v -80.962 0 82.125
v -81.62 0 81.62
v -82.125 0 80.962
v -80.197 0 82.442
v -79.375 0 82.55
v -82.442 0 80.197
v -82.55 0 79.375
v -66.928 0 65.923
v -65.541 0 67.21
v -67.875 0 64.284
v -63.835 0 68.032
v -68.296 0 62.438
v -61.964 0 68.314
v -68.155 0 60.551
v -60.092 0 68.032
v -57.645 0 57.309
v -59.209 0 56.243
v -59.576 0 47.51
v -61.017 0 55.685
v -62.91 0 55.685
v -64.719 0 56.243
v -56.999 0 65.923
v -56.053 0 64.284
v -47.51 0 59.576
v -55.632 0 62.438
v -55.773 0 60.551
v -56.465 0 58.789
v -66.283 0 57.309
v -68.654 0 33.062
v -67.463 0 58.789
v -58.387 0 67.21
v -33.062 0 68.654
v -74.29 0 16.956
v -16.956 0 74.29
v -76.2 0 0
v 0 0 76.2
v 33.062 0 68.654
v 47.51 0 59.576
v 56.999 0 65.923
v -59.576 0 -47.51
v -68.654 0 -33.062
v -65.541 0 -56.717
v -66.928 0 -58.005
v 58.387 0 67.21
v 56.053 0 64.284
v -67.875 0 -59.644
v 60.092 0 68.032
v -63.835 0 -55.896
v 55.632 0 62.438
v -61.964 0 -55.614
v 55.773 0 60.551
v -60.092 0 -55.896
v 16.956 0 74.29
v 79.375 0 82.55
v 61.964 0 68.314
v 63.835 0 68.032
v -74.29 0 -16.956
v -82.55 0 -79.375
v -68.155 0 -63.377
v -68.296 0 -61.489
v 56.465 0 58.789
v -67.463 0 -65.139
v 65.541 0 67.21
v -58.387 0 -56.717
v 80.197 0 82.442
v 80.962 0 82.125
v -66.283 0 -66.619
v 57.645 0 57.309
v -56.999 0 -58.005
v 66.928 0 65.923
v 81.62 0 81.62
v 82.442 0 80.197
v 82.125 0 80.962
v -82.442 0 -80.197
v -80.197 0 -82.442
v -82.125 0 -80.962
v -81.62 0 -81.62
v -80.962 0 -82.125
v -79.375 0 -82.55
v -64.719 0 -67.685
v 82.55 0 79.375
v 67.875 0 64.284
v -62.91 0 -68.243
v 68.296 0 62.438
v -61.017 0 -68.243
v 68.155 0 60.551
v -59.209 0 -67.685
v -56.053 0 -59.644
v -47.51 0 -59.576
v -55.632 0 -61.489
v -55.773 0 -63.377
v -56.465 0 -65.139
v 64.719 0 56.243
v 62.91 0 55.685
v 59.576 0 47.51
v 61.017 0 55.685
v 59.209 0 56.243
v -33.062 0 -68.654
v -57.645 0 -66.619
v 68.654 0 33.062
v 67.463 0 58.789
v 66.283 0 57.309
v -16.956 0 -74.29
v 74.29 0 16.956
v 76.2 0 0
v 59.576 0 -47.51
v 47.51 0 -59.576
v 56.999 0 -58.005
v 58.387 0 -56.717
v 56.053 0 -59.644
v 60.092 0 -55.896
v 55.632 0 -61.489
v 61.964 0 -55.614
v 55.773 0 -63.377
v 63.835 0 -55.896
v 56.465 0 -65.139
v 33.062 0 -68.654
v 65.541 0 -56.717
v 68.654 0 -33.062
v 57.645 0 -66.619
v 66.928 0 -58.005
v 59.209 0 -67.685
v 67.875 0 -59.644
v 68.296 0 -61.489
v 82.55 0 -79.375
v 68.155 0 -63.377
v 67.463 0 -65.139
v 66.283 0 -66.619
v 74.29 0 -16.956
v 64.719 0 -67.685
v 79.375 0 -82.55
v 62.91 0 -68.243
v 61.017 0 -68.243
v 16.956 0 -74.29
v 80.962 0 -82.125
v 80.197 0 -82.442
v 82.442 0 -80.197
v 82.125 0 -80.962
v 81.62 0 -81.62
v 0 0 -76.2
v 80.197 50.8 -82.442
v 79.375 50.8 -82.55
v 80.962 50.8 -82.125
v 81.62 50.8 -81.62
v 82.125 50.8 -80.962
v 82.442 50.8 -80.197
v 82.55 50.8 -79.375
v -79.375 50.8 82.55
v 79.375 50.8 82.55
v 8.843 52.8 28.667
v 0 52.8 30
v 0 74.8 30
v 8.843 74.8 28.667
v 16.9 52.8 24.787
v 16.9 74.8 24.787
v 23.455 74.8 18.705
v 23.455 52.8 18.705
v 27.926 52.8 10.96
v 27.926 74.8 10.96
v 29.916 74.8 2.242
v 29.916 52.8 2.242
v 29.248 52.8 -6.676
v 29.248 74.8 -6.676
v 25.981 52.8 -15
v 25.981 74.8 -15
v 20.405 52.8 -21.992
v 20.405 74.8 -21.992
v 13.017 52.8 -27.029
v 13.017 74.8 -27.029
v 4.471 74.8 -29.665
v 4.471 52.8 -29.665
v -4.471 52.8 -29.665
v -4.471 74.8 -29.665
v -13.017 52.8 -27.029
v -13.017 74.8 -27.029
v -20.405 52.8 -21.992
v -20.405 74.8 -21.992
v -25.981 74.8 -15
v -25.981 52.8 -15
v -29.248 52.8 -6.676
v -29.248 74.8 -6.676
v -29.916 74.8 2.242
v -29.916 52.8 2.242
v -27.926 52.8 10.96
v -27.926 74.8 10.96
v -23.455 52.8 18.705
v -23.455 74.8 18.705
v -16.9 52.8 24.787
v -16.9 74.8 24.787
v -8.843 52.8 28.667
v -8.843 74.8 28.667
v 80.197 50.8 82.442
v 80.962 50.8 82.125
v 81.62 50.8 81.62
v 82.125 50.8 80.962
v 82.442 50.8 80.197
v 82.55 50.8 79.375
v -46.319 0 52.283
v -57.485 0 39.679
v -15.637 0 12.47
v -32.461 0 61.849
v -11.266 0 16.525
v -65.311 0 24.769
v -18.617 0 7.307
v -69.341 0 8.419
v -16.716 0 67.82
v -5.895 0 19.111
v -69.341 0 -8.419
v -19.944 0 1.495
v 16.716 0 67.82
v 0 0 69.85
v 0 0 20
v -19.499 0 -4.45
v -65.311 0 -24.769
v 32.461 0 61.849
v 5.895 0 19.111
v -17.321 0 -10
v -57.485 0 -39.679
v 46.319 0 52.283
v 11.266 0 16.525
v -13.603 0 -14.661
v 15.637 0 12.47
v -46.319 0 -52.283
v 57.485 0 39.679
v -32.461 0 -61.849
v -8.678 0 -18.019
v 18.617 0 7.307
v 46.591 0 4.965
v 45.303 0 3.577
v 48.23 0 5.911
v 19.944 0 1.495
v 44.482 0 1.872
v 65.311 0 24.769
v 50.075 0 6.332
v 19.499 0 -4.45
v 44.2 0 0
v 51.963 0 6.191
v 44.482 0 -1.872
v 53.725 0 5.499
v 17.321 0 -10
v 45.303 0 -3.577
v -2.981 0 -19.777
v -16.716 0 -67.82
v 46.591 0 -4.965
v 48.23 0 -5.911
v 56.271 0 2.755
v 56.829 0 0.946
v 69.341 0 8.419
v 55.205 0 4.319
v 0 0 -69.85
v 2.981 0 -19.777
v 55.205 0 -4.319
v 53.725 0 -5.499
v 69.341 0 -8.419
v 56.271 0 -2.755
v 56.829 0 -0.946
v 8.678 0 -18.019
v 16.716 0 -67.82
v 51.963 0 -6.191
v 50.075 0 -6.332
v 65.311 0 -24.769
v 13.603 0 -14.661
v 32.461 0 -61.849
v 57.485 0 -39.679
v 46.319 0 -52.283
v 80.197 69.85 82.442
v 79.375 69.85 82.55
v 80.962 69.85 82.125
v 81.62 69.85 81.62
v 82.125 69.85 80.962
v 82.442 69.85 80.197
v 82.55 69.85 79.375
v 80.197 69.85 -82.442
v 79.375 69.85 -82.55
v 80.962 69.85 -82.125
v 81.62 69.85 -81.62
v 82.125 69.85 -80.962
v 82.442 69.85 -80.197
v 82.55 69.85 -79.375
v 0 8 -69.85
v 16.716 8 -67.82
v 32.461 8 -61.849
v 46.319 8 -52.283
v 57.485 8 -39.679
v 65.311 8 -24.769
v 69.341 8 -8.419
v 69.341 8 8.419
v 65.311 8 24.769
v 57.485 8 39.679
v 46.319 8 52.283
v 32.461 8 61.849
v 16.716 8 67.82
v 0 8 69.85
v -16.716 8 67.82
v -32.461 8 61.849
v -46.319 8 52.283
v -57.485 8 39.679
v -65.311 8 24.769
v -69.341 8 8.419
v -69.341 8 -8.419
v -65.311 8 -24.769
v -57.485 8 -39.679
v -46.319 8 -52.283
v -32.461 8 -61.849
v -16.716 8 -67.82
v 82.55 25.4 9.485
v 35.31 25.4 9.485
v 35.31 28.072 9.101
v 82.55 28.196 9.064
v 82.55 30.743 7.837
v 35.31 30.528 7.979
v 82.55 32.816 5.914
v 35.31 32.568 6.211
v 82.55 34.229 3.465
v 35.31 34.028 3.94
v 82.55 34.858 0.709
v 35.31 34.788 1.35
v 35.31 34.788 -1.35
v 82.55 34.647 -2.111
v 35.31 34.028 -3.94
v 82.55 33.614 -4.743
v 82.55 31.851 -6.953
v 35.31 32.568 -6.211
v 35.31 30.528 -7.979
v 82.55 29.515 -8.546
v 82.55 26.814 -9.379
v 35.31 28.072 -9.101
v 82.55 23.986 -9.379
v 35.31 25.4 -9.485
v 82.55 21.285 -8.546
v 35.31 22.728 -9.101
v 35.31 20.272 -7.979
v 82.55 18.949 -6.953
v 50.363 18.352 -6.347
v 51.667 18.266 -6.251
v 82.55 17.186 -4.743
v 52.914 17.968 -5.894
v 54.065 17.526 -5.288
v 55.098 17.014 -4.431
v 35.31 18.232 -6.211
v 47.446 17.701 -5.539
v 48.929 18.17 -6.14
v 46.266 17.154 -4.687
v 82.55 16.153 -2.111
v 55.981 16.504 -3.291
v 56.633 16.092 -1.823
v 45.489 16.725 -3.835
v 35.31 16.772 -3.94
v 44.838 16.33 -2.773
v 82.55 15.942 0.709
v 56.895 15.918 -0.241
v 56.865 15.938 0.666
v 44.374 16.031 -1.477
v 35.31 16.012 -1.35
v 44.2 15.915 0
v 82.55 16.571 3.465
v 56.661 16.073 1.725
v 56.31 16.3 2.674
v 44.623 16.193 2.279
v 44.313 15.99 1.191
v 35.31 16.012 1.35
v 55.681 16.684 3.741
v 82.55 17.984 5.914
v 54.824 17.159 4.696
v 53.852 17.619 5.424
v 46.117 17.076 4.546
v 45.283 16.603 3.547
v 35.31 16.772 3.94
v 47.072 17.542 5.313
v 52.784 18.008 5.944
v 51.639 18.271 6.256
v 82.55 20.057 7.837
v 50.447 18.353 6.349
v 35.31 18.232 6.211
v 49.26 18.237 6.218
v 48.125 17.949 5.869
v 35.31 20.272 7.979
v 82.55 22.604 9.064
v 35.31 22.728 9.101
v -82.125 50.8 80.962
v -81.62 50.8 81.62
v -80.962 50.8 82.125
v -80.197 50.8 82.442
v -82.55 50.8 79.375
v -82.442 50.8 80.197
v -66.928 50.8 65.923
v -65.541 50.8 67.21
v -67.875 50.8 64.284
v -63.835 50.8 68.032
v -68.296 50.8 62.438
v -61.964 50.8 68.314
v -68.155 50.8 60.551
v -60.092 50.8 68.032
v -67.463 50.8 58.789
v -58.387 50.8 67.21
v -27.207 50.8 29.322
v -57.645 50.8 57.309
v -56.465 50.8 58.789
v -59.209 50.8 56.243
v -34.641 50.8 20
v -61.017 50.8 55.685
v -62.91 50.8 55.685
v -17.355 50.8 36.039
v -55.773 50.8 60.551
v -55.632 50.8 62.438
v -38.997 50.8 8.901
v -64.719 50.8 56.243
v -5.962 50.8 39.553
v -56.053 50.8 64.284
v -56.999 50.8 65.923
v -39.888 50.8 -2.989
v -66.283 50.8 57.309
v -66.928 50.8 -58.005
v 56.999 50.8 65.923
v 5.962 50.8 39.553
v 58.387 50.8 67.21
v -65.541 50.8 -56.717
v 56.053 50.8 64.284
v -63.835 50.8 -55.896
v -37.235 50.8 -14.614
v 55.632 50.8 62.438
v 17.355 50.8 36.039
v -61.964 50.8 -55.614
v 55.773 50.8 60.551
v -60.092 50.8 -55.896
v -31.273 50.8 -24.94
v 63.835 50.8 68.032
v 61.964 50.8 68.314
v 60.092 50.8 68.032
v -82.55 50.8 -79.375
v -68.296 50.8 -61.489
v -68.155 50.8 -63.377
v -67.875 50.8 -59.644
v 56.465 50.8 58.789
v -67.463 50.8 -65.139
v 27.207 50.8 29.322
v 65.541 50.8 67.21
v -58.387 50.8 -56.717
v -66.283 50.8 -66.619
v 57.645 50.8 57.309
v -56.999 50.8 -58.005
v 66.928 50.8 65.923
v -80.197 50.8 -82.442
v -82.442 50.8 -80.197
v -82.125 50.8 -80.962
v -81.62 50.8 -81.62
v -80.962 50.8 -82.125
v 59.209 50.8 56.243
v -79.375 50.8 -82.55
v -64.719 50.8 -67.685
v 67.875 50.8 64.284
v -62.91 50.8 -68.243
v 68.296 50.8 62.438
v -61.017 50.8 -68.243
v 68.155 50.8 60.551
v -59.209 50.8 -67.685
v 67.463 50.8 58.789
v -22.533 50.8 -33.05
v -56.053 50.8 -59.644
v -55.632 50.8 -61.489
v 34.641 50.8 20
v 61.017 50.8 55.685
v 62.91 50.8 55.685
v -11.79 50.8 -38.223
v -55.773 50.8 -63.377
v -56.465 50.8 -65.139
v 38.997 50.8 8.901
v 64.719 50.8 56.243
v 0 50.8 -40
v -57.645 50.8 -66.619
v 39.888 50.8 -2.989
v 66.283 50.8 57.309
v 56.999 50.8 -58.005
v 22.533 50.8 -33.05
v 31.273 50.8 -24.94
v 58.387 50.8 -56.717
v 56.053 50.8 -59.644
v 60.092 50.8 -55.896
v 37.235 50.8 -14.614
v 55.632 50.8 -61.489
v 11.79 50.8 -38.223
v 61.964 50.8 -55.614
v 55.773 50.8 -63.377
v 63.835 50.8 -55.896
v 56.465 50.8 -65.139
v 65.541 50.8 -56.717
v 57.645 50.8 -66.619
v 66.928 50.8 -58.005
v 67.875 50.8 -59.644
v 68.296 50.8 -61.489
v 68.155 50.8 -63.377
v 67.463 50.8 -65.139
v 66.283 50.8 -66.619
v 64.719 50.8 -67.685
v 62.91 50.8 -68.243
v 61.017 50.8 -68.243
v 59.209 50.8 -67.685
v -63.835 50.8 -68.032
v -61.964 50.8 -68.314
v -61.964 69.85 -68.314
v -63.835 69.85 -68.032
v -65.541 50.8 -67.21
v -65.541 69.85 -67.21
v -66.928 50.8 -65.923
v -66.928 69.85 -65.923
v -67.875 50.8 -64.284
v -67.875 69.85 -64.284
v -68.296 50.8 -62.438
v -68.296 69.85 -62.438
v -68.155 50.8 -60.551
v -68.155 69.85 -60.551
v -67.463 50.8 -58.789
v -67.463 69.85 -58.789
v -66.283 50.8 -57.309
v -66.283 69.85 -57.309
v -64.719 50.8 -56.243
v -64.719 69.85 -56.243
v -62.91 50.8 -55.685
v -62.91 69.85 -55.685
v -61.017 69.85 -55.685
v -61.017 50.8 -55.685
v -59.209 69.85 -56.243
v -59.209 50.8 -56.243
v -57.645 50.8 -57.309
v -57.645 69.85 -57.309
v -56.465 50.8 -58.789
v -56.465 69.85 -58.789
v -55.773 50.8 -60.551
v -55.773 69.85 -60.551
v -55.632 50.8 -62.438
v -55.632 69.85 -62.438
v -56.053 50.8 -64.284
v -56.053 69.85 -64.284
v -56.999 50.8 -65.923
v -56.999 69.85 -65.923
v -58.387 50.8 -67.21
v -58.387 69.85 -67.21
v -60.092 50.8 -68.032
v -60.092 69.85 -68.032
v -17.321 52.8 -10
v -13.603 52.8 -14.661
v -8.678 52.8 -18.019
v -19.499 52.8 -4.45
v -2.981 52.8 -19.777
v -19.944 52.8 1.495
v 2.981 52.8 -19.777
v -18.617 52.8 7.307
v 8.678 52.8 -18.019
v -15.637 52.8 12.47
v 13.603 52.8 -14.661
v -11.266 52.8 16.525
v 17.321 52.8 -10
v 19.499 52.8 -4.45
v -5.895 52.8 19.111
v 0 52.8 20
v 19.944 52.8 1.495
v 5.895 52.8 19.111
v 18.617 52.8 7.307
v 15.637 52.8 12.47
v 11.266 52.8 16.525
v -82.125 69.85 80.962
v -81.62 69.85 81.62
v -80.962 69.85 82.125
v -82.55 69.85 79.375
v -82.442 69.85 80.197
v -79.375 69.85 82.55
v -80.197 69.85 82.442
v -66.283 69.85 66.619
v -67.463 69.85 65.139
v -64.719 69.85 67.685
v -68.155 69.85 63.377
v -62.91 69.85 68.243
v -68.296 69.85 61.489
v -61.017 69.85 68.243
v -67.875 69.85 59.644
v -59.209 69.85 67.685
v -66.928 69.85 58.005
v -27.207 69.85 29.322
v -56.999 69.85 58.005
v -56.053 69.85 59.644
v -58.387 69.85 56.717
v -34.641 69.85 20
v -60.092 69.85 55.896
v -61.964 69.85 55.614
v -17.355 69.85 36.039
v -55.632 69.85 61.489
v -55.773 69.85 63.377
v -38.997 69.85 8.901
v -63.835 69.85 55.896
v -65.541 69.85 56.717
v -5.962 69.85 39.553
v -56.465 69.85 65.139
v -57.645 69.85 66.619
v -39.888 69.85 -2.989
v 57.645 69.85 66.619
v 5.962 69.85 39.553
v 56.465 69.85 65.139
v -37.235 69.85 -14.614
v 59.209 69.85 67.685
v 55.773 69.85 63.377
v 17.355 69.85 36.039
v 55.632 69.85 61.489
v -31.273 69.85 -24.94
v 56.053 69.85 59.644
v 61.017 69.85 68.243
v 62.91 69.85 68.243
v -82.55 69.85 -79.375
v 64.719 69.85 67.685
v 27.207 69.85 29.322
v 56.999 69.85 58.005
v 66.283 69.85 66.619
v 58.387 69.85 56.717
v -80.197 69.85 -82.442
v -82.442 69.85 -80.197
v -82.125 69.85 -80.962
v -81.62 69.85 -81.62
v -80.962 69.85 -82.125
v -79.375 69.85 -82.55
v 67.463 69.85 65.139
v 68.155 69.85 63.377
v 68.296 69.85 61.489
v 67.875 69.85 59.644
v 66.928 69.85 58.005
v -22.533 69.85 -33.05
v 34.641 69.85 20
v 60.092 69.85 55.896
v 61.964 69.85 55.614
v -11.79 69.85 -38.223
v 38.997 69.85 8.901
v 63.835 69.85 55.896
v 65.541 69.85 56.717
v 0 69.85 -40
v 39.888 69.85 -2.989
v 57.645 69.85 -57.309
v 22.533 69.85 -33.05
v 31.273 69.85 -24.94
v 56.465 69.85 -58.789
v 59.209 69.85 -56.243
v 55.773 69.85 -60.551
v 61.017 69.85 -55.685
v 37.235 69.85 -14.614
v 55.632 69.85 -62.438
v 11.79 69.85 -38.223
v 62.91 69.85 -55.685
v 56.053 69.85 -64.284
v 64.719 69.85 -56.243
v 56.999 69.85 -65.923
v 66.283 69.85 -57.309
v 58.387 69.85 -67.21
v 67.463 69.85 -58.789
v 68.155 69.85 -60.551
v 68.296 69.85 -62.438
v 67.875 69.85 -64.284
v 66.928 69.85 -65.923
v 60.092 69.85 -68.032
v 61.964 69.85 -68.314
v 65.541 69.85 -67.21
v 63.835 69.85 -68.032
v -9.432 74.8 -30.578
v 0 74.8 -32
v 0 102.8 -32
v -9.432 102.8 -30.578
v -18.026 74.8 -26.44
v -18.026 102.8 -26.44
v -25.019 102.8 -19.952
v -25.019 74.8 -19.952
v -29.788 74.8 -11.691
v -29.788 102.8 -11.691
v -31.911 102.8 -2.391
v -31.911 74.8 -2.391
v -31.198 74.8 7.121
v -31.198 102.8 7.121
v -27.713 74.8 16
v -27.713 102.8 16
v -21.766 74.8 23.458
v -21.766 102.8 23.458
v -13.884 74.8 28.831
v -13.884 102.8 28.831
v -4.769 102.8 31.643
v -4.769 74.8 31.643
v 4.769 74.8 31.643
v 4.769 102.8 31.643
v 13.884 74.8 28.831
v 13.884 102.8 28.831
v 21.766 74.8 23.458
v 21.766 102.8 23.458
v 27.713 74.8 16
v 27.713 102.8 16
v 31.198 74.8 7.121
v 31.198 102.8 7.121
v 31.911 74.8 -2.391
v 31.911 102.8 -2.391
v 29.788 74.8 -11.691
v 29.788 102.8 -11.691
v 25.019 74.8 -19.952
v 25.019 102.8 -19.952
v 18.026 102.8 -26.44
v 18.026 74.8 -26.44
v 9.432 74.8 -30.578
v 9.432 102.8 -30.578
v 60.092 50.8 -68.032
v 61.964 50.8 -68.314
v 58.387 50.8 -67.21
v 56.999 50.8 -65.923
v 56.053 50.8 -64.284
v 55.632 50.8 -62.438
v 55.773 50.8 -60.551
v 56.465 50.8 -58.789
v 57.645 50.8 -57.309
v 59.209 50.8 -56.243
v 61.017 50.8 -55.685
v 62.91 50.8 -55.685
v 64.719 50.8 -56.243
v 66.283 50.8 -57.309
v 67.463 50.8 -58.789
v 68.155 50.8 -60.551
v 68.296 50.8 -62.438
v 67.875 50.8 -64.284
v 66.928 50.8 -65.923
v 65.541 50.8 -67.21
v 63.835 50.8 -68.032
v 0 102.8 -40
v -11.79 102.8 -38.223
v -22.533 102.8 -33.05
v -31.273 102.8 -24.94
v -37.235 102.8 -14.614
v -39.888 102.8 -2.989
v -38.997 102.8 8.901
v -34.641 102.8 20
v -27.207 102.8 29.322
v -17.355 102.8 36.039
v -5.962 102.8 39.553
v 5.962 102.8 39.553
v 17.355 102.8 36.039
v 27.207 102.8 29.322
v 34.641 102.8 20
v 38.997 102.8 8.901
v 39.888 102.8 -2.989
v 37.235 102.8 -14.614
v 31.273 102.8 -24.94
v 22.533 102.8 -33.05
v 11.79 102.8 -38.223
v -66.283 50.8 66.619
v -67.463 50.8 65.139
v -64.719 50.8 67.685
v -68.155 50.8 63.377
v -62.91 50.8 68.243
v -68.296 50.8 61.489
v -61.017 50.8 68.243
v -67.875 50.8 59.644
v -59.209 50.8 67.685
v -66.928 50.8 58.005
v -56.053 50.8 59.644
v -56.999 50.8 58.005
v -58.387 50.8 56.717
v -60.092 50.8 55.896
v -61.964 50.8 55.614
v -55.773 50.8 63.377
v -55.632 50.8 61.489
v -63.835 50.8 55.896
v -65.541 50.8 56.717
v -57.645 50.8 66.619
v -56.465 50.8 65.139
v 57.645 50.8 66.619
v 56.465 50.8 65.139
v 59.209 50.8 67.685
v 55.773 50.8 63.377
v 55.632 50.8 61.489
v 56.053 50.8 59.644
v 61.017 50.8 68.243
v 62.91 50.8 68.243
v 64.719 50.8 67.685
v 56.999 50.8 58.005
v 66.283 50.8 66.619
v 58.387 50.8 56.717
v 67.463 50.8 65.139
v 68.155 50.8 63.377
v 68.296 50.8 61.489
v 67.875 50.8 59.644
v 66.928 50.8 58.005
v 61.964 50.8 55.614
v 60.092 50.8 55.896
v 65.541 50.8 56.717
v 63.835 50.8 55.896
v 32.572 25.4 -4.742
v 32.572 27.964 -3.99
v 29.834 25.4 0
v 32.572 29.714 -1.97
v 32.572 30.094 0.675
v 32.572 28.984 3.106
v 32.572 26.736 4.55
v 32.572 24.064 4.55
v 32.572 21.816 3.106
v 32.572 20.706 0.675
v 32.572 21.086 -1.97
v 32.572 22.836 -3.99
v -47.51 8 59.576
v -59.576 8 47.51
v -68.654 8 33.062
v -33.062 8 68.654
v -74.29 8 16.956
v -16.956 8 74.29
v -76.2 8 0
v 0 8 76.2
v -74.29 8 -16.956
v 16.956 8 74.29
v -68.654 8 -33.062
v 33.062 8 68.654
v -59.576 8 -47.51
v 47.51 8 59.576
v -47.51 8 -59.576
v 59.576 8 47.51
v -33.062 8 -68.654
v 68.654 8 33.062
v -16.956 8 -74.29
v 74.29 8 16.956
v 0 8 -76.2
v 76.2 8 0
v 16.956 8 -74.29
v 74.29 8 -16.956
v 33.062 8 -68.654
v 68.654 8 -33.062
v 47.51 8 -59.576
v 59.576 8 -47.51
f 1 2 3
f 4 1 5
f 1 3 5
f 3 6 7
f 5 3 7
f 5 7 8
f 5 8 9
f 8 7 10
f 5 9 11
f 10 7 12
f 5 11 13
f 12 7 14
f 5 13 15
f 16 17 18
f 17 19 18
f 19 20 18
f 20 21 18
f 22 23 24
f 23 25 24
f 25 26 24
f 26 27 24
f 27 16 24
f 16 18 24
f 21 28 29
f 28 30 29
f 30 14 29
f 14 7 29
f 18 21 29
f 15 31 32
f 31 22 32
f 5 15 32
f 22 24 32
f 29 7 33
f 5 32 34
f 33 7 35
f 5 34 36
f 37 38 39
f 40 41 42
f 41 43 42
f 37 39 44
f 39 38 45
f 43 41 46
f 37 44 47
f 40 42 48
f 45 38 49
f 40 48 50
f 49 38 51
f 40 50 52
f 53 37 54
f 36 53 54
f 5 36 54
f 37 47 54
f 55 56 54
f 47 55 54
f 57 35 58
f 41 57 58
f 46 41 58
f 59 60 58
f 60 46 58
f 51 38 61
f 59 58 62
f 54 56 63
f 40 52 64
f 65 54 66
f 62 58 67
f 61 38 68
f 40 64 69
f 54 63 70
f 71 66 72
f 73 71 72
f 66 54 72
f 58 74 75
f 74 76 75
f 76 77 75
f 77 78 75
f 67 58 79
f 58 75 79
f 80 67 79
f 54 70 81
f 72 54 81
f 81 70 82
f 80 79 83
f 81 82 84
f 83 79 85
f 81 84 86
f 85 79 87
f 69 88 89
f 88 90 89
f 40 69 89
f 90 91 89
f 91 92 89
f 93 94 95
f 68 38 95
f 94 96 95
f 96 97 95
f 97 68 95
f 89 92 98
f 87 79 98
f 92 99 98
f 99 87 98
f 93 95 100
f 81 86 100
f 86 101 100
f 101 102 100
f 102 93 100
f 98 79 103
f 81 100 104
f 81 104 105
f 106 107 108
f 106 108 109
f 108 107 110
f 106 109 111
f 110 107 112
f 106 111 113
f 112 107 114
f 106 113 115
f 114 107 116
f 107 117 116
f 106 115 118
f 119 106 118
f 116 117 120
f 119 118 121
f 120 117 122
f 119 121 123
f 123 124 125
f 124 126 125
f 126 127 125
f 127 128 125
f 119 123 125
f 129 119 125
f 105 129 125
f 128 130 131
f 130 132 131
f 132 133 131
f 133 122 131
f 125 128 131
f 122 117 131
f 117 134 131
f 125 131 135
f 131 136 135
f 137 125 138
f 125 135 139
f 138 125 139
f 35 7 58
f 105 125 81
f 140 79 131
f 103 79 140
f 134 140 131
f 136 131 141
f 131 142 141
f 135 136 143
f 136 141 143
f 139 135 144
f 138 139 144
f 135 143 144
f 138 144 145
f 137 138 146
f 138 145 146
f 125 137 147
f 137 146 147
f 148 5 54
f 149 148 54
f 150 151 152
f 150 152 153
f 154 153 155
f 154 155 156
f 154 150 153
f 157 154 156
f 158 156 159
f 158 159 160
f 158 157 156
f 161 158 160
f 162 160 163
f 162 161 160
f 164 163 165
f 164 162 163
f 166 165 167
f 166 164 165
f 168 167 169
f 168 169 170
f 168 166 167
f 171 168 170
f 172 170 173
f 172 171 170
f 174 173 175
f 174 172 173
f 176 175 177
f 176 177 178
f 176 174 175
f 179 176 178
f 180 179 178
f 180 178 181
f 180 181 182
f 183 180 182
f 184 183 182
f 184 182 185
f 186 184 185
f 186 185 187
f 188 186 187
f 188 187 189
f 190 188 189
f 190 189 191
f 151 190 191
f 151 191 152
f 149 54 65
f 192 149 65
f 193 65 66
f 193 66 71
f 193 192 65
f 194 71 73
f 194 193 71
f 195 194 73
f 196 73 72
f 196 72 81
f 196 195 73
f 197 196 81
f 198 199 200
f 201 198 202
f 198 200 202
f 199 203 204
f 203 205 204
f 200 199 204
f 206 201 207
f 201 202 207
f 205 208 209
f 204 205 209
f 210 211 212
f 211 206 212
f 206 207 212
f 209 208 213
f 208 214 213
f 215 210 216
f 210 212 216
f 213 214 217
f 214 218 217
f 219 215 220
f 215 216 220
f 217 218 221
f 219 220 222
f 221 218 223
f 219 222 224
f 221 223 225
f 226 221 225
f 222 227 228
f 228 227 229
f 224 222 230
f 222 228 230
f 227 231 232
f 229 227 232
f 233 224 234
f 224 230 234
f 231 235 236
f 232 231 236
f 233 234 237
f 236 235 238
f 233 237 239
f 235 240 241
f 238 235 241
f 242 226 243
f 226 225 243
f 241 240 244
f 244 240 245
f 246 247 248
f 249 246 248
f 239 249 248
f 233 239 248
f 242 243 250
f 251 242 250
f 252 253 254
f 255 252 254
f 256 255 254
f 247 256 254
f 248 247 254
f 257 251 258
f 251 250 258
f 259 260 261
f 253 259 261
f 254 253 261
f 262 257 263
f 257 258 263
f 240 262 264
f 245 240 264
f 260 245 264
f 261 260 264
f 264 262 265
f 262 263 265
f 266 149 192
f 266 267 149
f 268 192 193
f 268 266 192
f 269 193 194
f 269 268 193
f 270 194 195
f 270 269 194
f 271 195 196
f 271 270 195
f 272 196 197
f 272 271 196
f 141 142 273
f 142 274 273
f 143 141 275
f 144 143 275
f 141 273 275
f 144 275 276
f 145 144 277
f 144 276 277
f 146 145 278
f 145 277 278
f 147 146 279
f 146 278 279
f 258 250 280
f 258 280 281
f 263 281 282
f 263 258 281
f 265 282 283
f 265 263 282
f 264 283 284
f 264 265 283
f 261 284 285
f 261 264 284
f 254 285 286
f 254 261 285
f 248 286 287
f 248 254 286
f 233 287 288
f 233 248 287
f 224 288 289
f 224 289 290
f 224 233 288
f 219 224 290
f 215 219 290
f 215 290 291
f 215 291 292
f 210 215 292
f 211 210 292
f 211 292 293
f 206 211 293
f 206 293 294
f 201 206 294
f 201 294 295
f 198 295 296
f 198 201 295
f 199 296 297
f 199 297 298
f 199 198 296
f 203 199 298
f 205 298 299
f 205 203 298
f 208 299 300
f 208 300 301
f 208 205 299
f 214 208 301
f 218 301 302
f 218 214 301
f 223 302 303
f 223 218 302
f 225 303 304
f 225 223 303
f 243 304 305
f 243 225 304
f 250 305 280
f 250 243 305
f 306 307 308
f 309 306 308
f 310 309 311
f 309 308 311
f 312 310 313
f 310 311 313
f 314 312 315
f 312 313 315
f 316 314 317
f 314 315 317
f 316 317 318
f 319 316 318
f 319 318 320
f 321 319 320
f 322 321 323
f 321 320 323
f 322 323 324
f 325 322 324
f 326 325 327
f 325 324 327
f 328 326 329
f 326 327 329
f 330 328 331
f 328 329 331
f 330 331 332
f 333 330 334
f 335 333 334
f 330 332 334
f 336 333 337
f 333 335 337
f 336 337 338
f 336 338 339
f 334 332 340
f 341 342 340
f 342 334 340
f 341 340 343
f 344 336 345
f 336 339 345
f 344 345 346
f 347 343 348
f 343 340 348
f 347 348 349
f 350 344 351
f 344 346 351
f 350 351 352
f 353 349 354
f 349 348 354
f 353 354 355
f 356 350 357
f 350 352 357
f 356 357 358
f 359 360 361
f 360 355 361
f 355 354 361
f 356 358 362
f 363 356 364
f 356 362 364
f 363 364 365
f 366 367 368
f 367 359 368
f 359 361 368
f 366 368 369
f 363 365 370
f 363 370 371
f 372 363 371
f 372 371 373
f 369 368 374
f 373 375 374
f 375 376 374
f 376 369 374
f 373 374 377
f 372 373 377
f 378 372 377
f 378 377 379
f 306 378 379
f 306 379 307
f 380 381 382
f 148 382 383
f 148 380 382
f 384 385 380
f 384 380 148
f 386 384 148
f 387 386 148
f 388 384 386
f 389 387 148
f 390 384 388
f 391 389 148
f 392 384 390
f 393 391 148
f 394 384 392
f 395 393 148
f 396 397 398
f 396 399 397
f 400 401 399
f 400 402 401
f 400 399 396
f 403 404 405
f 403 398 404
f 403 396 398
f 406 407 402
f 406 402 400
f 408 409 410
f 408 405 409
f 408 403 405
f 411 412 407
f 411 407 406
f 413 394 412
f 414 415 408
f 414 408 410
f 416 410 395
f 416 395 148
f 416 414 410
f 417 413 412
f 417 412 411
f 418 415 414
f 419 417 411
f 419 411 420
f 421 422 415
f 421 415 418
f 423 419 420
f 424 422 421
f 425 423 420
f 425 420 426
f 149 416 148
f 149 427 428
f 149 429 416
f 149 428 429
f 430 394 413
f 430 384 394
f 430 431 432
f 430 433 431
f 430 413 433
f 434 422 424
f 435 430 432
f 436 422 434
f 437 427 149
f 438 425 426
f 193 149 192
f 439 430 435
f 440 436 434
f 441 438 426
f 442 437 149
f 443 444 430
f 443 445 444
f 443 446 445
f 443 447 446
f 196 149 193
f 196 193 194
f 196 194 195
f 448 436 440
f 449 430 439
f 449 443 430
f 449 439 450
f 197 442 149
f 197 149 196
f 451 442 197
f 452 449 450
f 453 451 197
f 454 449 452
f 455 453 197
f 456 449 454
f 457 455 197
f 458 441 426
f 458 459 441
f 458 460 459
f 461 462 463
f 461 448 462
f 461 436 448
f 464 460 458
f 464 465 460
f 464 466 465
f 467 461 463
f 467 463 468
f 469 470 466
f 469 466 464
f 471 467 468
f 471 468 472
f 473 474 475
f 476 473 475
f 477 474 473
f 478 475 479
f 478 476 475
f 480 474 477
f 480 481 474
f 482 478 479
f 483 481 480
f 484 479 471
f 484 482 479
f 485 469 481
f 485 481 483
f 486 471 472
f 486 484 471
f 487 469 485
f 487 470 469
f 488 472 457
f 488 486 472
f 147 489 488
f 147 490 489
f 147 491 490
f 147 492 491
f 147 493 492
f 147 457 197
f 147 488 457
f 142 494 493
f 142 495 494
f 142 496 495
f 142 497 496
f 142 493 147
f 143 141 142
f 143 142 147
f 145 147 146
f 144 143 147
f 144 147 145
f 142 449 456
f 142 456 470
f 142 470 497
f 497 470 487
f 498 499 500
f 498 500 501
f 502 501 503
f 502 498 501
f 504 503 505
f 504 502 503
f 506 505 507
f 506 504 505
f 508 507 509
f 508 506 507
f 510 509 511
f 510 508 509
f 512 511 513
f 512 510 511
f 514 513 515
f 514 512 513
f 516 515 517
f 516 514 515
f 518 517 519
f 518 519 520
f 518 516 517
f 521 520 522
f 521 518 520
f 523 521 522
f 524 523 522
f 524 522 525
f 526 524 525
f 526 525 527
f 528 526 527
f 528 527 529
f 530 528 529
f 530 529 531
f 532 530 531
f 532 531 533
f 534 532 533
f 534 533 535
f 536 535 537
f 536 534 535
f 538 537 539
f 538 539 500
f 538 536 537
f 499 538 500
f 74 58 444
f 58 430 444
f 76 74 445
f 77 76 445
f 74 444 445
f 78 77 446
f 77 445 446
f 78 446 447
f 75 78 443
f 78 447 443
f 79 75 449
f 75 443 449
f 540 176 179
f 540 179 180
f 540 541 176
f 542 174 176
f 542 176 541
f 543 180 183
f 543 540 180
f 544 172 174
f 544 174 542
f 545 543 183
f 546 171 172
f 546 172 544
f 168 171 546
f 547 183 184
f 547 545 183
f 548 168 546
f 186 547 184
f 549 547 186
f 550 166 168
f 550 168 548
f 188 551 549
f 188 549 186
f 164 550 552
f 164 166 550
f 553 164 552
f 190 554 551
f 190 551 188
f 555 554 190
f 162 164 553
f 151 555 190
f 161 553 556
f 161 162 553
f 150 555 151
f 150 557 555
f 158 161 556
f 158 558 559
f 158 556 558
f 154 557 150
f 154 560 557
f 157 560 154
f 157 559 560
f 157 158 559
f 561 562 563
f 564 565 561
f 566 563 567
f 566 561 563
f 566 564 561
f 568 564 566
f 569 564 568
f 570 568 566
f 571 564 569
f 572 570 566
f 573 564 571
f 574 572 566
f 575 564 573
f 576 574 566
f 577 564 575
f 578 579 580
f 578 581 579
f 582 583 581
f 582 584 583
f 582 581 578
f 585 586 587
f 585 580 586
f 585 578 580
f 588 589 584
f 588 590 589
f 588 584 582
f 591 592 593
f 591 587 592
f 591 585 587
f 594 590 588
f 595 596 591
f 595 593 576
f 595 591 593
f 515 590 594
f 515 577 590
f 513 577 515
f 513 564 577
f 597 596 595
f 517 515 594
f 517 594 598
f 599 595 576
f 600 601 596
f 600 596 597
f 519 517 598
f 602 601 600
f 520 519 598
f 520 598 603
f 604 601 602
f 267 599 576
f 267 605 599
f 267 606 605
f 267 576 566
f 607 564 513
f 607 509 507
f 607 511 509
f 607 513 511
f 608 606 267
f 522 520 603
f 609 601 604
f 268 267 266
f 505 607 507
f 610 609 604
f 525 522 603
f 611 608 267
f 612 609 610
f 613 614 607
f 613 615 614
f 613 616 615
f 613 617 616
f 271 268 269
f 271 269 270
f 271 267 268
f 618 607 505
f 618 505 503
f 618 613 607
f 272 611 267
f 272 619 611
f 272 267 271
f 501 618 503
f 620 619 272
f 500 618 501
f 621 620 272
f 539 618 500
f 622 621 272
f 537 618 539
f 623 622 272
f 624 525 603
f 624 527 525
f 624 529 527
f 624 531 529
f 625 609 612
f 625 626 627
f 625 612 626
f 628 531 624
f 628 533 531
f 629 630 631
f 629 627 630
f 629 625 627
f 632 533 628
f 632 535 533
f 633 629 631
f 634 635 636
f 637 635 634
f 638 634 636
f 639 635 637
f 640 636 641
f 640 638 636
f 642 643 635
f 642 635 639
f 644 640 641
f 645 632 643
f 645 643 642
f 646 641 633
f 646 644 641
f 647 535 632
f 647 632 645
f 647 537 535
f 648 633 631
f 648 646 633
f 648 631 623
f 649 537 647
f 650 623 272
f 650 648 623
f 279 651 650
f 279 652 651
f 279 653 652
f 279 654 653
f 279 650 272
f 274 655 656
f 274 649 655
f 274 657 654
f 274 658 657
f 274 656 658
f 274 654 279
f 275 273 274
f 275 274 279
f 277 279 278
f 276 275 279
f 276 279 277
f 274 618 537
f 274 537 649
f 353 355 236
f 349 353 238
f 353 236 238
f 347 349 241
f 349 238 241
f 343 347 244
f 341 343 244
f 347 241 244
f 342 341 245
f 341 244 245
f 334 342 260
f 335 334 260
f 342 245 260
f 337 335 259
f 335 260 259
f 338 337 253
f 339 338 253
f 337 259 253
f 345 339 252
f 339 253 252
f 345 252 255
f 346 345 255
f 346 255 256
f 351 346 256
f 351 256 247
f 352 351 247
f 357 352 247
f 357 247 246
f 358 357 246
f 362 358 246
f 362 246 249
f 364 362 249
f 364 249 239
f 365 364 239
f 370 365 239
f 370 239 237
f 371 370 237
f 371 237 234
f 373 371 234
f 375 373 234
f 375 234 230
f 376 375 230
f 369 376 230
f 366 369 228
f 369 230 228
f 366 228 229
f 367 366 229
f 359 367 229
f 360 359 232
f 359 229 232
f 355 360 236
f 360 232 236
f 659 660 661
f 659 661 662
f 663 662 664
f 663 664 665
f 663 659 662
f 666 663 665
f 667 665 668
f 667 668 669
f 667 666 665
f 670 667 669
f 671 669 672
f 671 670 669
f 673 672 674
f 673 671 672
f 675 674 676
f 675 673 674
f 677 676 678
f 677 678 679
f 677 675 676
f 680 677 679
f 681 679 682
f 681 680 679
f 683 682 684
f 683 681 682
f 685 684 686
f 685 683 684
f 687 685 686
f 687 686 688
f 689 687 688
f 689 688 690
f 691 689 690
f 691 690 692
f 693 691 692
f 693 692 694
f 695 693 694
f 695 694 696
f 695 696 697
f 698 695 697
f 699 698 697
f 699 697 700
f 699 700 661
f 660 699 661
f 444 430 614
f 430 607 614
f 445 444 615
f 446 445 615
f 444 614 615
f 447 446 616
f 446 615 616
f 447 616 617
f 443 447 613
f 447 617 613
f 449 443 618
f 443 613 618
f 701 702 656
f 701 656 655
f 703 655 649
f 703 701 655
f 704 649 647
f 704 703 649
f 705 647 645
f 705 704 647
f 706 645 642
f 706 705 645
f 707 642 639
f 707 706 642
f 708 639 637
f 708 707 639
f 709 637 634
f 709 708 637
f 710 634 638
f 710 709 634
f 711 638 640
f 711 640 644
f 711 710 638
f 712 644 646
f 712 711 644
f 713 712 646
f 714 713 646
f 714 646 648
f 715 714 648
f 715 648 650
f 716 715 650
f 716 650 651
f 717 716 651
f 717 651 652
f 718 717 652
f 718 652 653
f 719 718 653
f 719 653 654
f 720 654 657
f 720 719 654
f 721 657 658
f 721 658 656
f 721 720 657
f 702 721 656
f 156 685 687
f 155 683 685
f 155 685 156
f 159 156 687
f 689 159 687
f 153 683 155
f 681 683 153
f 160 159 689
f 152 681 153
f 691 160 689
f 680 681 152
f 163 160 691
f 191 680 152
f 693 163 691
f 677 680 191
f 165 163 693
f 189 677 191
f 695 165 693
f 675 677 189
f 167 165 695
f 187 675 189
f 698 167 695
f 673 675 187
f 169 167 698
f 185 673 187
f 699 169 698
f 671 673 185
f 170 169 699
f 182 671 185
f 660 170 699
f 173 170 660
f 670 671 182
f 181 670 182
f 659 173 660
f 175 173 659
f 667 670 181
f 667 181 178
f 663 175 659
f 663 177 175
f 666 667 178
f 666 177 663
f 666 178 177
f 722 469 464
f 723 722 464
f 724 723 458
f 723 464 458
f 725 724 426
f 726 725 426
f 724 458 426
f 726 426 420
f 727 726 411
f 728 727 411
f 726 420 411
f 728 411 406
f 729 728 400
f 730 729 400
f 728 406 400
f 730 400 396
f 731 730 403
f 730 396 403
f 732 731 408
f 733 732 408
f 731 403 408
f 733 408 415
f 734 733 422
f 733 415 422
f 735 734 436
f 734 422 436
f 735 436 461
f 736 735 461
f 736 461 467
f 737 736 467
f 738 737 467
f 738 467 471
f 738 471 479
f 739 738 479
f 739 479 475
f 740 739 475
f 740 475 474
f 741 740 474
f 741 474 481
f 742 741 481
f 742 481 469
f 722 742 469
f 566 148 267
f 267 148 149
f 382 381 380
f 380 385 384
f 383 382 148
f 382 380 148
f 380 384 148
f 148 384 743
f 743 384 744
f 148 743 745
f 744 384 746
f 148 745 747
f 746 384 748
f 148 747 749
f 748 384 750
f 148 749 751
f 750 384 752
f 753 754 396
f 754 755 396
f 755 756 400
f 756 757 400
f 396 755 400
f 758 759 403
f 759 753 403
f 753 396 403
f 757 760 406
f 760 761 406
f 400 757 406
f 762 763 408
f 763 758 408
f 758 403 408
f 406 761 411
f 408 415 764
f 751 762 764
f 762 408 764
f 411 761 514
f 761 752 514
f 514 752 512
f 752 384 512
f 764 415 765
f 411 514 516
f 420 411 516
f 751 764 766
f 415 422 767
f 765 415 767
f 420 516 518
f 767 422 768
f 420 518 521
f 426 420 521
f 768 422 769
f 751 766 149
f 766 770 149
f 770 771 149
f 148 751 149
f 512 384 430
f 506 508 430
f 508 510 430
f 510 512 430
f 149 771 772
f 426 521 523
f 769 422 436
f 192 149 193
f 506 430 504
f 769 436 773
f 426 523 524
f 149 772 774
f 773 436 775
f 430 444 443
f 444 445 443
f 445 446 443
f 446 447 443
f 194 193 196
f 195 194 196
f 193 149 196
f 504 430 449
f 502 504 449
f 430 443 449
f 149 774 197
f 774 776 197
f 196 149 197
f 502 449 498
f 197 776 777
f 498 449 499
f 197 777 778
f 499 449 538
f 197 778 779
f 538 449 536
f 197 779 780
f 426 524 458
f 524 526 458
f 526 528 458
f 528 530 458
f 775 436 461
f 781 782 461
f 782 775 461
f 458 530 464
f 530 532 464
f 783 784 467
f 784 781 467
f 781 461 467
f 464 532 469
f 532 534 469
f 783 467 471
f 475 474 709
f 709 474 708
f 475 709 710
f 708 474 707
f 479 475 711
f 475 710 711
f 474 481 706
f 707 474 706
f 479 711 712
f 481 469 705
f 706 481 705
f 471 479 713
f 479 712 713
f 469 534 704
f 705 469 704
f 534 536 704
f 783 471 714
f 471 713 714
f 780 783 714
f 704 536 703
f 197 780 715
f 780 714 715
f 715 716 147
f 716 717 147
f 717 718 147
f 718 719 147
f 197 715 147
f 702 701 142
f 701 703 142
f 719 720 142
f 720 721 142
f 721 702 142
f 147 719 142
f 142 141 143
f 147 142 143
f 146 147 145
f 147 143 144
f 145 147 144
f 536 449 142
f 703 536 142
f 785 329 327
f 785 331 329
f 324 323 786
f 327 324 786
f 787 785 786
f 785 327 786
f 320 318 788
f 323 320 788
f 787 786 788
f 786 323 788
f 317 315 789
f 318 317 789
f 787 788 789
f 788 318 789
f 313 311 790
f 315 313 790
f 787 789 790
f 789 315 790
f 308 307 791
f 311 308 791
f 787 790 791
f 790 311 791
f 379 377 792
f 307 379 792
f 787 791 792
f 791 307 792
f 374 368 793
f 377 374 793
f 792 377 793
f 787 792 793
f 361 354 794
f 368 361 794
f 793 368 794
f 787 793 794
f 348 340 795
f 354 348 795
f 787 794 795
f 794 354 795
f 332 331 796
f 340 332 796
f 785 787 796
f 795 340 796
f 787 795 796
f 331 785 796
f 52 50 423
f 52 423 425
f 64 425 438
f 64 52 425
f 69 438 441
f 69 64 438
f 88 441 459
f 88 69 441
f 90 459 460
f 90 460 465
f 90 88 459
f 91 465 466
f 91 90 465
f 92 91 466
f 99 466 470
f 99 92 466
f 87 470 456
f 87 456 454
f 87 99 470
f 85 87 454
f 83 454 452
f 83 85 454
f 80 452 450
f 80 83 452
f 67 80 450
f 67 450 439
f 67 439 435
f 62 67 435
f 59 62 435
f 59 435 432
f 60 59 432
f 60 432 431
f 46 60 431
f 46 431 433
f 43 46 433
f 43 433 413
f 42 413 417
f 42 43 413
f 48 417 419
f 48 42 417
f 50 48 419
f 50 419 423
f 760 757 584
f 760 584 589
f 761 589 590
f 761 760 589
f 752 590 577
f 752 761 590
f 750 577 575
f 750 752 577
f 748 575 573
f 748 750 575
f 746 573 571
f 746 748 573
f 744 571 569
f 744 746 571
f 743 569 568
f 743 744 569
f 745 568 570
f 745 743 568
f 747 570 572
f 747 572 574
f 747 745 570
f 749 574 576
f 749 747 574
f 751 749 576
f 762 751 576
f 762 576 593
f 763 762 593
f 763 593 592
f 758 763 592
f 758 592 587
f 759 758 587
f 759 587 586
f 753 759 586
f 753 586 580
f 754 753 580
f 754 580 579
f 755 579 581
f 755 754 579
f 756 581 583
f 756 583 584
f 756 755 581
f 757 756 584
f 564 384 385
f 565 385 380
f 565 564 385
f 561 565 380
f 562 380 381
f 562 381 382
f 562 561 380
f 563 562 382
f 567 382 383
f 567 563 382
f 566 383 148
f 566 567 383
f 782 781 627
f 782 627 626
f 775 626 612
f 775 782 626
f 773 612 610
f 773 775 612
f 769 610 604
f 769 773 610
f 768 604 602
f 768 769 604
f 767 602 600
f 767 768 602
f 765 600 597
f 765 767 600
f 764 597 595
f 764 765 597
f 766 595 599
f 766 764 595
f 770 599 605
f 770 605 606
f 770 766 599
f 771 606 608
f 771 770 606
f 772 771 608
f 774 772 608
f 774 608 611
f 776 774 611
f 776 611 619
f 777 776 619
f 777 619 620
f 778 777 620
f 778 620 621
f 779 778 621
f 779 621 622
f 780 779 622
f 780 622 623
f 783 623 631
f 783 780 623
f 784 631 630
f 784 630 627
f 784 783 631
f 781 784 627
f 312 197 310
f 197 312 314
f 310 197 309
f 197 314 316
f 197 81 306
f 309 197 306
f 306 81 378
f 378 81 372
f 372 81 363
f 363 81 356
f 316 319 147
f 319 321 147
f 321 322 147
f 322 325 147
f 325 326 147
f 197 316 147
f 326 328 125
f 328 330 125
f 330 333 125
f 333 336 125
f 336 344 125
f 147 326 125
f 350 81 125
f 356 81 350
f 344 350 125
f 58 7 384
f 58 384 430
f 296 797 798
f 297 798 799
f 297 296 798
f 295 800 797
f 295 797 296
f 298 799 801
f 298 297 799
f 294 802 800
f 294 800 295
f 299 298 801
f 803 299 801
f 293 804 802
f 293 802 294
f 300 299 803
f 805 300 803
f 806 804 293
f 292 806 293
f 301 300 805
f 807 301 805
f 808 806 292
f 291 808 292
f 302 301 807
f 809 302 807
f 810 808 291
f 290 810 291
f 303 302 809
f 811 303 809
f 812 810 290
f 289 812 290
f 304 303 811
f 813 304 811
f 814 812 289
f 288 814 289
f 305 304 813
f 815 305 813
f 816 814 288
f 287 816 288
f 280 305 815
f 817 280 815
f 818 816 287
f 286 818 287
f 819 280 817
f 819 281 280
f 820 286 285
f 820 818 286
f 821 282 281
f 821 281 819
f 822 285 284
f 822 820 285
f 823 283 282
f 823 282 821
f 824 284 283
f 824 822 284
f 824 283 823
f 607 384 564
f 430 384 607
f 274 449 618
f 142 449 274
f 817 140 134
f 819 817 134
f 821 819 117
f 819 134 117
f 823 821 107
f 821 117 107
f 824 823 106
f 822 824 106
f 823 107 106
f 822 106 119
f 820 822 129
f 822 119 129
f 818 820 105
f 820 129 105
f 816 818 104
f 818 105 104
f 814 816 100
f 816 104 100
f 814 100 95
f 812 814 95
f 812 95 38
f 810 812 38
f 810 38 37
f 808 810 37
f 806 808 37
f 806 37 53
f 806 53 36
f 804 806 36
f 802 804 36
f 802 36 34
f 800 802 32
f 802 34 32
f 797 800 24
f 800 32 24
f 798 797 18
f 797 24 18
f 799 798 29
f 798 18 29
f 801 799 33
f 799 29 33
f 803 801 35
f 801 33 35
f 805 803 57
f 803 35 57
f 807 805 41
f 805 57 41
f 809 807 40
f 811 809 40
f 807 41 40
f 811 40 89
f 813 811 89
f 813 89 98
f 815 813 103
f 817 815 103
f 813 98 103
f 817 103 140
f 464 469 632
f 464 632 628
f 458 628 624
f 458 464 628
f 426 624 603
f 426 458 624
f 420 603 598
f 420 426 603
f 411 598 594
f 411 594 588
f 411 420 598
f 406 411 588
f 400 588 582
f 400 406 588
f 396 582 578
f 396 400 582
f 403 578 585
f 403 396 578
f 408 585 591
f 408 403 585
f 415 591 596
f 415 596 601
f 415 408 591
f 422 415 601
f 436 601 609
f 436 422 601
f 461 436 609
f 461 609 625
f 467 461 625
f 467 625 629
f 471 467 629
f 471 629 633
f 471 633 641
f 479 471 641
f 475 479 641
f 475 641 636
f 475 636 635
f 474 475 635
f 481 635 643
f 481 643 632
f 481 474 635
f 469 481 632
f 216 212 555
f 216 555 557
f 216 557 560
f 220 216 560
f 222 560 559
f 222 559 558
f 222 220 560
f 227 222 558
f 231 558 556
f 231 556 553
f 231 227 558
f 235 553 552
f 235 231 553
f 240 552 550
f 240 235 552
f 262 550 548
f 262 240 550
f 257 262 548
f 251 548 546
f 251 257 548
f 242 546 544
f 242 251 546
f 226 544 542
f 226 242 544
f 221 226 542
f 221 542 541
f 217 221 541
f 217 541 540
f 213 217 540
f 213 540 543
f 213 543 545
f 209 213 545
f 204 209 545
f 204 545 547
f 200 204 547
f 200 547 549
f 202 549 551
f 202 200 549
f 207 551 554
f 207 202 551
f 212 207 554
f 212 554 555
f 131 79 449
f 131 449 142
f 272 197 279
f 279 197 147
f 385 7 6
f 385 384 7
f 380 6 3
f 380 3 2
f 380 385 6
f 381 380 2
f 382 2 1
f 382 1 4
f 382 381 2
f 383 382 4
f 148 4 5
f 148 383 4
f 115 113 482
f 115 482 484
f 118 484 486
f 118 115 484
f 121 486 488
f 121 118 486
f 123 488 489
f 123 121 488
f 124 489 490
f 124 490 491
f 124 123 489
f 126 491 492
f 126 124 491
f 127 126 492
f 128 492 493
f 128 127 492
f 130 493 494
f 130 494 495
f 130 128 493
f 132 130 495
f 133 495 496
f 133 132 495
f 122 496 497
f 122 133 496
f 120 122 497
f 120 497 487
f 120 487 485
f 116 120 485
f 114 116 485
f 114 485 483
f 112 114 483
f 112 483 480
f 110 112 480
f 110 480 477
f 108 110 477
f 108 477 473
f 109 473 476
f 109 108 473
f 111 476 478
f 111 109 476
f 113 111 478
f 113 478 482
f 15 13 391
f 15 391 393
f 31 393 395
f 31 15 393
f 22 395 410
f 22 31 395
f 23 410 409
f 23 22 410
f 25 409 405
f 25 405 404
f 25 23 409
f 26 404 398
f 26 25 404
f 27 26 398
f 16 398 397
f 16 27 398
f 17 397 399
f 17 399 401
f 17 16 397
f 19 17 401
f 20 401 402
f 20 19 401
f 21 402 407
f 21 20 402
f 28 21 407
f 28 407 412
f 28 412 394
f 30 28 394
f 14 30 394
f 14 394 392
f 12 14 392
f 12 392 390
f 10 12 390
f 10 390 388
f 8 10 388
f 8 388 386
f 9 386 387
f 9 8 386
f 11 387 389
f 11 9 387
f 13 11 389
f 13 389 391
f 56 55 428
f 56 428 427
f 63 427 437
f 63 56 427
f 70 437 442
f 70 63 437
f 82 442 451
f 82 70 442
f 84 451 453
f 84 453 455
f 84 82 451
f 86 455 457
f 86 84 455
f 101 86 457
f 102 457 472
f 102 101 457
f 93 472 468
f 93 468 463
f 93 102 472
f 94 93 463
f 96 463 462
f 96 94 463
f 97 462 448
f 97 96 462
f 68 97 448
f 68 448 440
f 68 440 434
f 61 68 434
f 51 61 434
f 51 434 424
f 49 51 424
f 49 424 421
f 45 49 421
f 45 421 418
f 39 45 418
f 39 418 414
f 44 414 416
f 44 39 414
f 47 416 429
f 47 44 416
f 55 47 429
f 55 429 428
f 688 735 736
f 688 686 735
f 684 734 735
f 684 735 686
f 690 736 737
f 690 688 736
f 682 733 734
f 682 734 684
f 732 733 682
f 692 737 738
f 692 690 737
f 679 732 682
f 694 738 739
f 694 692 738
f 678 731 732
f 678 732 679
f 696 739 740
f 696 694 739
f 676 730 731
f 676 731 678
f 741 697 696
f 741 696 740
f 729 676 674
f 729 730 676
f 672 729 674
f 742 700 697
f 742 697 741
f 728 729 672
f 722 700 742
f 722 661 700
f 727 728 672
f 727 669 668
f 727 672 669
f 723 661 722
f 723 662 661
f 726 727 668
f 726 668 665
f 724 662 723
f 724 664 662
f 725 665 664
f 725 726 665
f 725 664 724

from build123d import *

# Parameters (mm, degrees)
SKETCH1_R                  = 40
SKETCH1_R_2                = 32
BOSS_EXTRUDE1_DEPTH        = 102.8
SKETCH1_3_R                = 32
SKETCH1_3_R_2              = 30
BOSS_EXTRUDE2_DEPTH        = 74.8
SKETCH1_4_R                = 30
SKETCH1_4_R_2              = 20
BOSS_EXTRUDE3_DEPTH        = 52.8
SKETCH1_5_W                = 165.1
SKETCH1_5_H                = 165.1
SKETCH1_5_R                = 6.35
SKETCH1_5_R_2              = 40
BOSS_EXTRUDE4_DEPTH        = 50.8
SKETCH2_R                  = 76.2
SKETCH2_R_2                = 69.85
CUT_EXTRUDE1_DEPTH         = 8
F_1_0MM_DOWEL_HOLE1_D      = 18.97
F_1_0MM_DOWEL_HOLE1_DEPTH  = 47.24
F_1_0MM_DOWEL_HOLE1_TIP    = 5.476167303
F_1_0MM_DOWEL_HOLE3_REACH  = 157.553
F_1_0MM_DOWEL_HOLE3_BORE_R = 6.35
SKETCH12_W                 = 165.1
SKETCH12_H                 = 165.1
SKETCH12_R                 = 40
SKETCH12_R_2               = 6.35
BOSS_EXTRUDE5_DEPTH        = 19.05
FILLET3_R                  = 3.175
FILLET4_R                  = 3.175


with BuildPart() as part:
    # Sketch1 → Boss-Extrude1 (new body)
    with BuildSketch(Plane(origin=(0, 0, 0), x_dir=(1, 0, 0), z_dir=(0, 1, 0))):
        with Locations(Location((0, 0, 0), (0, 0, 90))):
            Circle(SKETCH1_R)
        with Locations(Location((0, 0, 0), (0, 0, 90))):
            Circle(SKETCH1_R_2, mode=Mode.SUBTRACT)
    extrude(amount=BOSS_EXTRUDE1_DEPTH)

    # Sketch1<3> → Boss-Extrude2 (add)
    with BuildSketch(Plane(origin=(0, 0, 0), x_dir=(1, 0, 0), z_dir=(0, 1, 0))):
        with Locations(Location((0, 0, 0), (0, 0, 90))):
            Circle(SKETCH1_3_R)
        with Locations(Location((0, 0, 0), (0, 0, 270))):
            Circle(SKETCH1_3_R_2, mode=Mode.SUBTRACT)
    extrude(amount=BOSS_EXTRUDE2_DEPTH)

    # Sketch1<4> → Boss-Extrude3 (add)
    with BuildSketch(Plane(origin=(0, 0, 0), x_dir=(1, 0, 0), z_dir=(0, 1, 0))):
        with Locations(Location((0, 0, 0), (0, 0, 270))):
            Circle(SKETCH1_4_R)
        with Locations(Location((0, 0, 0), (0, 0, 270))):
            Circle(SKETCH1_4_R_2, mode=Mode.SUBTRACT)
    extrude(amount=BOSS_EXTRUDE3_DEPTH)

    # Sketch1<5> → Boss-Extrude4 (add)
    with BuildSketch(Plane(origin=(0, 0, 0), x_dir=(1, 0, 0), z_dir=(0, 1, 0))):
        Rectangle(SKETCH1_5_W, SKETCH1_5_H)
        with Locations(Location((-61.963767235, -61.963767235, 0), (0, 0, 270))):
            Circle(SKETCH1_5_R, mode=Mode.SUBTRACT)
        with Locations(Location((61.963767235, -61.963767235, 0), (0, 0, 270))):
            Circle(SKETCH1_5_R, mode=Mode.SUBTRACT)
        with Locations(Location((61.963767235, 61.963767235, 0), (0, 0, 270))):
            Circle(SKETCH1_5_R, mode=Mode.SUBTRACT)
        with Locations(Location((-61.963767235, 61.963767235, 0), (0, 0, 270))):
            Circle(SKETCH1_5_R, mode=Mode.SUBTRACT)
        with Locations(Location((0, 0, 0), (0, 0, 90))):
            Circle(SKETCH1_5_R_2, mode=Mode.SUBTRACT)
    extrude(amount=BOSS_EXTRUDE4_DEPTH)

    # Sketch2 → Cut-Extrude1 (cut)
    with BuildSketch(Plane.XZ):
        with Locations(Location((0, 0, 0), (0, 0, 270))):
            Circle(SKETCH2_R)
        with Locations(Location((0, 0, 0), (0, 0, 270))):
            Circle(SKETCH2_R_2, mode=Mode.SUBTRACT)
    extrude(amount=-CUT_EXTRUDE1_DEPTH, mode=Mode.SUBTRACT)

    # Ø1.0mm Dowel Hole1
    with Locations(Plane(origin=(82.55, 0, 0), x_dir=(0, 0, -1), z_dir=(1, 0, 0))):
        with Locations((0, 25.4)):
            Hole(F_1_0MM_DOWEL_HOLE1_D / 2, depth=F_1_0MM_DOWEL_HOLE1_DEPTH)
            with Locations((0, 0, -(F_1_0MM_DOWEL_HOLE1_DEPTH + F_1_0MM_DOWEL_HOLE1_TIP / 2))):  # 120° drill point
                Cone(0, F_1_0MM_DOWEL_HOLE1_D / 2, F_1_0MM_DOWEL_HOLE1_TIP, mode=Mode.SUBTRACT)

    # Ø1.0mm Dowel Hole3 bore → Ø1.0mm Dowel Hole3 (cut, up to next)
    with BuildSketch(Plane(origin=(0, 0, 0), x_dir=(-1, 0, 0), z_dir=(0, -1, 0)), mode=Mode.PRIVATE) as f_1_0mm_dowel_hole3_sk1:
        with Locations((-50.55, 0)):
            Circle(F_1_0MM_DOWEL_HOLE3_BORE_R)
    f_1_0mm_dowel_hole3_tool1 = extrude(f_1_0mm_dowel_hole3_sk1.sketch, amount=-F_1_0MM_DOWEL_HOLE3_REACH, mode=Mode.PRIVATE) & part.part
    add(f_1_0mm_dowel_hole3_tool1.solids().sort_by_distance((50.55, 0, 0))[0], mode=Mode.SUBTRACT)

    # Fillet3
    fillet3_edges = [part.edges().sort_by_distance(p)[0] for p in [
        (82.55, 25.4, 82.55),
        (82.55, 25.4, -82.55),
        (-82.55, 25.4, -82.55),
        (-82.55, 25.4, 82.55),
    ]]
    fillet(fillet3_edges, radius=FILLET3_R)


with BuildPart() as body_2:
    # Sketch12 → Boss-Extrude5 (new body)
    with BuildSketch(Plane(origin=(0, 50.8, 0), x_dir=(1, 0, 0), z_dir=(0, 1, 0))):
        Rectangle(SKETCH12_W, SKETCH12_H)
        with Locations(Location((0, 0, 0), (0, 0, 90))):
            Circle(SKETCH12_R, mode=Mode.SUBTRACT)
        with Locations(Location((-61.963767235, -61.963767235, 0), (0, 0, 90))):
            Circle(SKETCH12_R_2, mode=Mode.SUBTRACT)
        with Locations(Location((-61.963767235, 61.963767235, 0), (0, 0, 90))):
            Circle(SKETCH12_R_2, mode=Mode.SUBTRACT)
        with Locations(Location((61.963767235, 61.963767235, 0), (0, 0, 90))):
            Circle(SKETCH12_R_2, mode=Mode.SUBTRACT)
        with Locations(Location((61.963767235, -61.963767235, 0), (0, 0, 90))):
            Circle(SKETCH12_R_2, mode=Mode.SUBTRACT)
    extrude(amount=BOSS_EXTRUDE5_DEPTH)

    # Fillet4
    fillet4_edges = [body_2.edges().sort_by_distance(p)[0] for p in [
        (-82.55, 60.325, 82.55),
        (-82.55, 60.325, -82.55),
        (82.55, 60.325, -82.55),
        (82.55, 60.325, 82.55),
    ]]
    fillet(fillet4_edges, radius=FILLET4_R)


solid = Compound([part.part, body_2.part])
